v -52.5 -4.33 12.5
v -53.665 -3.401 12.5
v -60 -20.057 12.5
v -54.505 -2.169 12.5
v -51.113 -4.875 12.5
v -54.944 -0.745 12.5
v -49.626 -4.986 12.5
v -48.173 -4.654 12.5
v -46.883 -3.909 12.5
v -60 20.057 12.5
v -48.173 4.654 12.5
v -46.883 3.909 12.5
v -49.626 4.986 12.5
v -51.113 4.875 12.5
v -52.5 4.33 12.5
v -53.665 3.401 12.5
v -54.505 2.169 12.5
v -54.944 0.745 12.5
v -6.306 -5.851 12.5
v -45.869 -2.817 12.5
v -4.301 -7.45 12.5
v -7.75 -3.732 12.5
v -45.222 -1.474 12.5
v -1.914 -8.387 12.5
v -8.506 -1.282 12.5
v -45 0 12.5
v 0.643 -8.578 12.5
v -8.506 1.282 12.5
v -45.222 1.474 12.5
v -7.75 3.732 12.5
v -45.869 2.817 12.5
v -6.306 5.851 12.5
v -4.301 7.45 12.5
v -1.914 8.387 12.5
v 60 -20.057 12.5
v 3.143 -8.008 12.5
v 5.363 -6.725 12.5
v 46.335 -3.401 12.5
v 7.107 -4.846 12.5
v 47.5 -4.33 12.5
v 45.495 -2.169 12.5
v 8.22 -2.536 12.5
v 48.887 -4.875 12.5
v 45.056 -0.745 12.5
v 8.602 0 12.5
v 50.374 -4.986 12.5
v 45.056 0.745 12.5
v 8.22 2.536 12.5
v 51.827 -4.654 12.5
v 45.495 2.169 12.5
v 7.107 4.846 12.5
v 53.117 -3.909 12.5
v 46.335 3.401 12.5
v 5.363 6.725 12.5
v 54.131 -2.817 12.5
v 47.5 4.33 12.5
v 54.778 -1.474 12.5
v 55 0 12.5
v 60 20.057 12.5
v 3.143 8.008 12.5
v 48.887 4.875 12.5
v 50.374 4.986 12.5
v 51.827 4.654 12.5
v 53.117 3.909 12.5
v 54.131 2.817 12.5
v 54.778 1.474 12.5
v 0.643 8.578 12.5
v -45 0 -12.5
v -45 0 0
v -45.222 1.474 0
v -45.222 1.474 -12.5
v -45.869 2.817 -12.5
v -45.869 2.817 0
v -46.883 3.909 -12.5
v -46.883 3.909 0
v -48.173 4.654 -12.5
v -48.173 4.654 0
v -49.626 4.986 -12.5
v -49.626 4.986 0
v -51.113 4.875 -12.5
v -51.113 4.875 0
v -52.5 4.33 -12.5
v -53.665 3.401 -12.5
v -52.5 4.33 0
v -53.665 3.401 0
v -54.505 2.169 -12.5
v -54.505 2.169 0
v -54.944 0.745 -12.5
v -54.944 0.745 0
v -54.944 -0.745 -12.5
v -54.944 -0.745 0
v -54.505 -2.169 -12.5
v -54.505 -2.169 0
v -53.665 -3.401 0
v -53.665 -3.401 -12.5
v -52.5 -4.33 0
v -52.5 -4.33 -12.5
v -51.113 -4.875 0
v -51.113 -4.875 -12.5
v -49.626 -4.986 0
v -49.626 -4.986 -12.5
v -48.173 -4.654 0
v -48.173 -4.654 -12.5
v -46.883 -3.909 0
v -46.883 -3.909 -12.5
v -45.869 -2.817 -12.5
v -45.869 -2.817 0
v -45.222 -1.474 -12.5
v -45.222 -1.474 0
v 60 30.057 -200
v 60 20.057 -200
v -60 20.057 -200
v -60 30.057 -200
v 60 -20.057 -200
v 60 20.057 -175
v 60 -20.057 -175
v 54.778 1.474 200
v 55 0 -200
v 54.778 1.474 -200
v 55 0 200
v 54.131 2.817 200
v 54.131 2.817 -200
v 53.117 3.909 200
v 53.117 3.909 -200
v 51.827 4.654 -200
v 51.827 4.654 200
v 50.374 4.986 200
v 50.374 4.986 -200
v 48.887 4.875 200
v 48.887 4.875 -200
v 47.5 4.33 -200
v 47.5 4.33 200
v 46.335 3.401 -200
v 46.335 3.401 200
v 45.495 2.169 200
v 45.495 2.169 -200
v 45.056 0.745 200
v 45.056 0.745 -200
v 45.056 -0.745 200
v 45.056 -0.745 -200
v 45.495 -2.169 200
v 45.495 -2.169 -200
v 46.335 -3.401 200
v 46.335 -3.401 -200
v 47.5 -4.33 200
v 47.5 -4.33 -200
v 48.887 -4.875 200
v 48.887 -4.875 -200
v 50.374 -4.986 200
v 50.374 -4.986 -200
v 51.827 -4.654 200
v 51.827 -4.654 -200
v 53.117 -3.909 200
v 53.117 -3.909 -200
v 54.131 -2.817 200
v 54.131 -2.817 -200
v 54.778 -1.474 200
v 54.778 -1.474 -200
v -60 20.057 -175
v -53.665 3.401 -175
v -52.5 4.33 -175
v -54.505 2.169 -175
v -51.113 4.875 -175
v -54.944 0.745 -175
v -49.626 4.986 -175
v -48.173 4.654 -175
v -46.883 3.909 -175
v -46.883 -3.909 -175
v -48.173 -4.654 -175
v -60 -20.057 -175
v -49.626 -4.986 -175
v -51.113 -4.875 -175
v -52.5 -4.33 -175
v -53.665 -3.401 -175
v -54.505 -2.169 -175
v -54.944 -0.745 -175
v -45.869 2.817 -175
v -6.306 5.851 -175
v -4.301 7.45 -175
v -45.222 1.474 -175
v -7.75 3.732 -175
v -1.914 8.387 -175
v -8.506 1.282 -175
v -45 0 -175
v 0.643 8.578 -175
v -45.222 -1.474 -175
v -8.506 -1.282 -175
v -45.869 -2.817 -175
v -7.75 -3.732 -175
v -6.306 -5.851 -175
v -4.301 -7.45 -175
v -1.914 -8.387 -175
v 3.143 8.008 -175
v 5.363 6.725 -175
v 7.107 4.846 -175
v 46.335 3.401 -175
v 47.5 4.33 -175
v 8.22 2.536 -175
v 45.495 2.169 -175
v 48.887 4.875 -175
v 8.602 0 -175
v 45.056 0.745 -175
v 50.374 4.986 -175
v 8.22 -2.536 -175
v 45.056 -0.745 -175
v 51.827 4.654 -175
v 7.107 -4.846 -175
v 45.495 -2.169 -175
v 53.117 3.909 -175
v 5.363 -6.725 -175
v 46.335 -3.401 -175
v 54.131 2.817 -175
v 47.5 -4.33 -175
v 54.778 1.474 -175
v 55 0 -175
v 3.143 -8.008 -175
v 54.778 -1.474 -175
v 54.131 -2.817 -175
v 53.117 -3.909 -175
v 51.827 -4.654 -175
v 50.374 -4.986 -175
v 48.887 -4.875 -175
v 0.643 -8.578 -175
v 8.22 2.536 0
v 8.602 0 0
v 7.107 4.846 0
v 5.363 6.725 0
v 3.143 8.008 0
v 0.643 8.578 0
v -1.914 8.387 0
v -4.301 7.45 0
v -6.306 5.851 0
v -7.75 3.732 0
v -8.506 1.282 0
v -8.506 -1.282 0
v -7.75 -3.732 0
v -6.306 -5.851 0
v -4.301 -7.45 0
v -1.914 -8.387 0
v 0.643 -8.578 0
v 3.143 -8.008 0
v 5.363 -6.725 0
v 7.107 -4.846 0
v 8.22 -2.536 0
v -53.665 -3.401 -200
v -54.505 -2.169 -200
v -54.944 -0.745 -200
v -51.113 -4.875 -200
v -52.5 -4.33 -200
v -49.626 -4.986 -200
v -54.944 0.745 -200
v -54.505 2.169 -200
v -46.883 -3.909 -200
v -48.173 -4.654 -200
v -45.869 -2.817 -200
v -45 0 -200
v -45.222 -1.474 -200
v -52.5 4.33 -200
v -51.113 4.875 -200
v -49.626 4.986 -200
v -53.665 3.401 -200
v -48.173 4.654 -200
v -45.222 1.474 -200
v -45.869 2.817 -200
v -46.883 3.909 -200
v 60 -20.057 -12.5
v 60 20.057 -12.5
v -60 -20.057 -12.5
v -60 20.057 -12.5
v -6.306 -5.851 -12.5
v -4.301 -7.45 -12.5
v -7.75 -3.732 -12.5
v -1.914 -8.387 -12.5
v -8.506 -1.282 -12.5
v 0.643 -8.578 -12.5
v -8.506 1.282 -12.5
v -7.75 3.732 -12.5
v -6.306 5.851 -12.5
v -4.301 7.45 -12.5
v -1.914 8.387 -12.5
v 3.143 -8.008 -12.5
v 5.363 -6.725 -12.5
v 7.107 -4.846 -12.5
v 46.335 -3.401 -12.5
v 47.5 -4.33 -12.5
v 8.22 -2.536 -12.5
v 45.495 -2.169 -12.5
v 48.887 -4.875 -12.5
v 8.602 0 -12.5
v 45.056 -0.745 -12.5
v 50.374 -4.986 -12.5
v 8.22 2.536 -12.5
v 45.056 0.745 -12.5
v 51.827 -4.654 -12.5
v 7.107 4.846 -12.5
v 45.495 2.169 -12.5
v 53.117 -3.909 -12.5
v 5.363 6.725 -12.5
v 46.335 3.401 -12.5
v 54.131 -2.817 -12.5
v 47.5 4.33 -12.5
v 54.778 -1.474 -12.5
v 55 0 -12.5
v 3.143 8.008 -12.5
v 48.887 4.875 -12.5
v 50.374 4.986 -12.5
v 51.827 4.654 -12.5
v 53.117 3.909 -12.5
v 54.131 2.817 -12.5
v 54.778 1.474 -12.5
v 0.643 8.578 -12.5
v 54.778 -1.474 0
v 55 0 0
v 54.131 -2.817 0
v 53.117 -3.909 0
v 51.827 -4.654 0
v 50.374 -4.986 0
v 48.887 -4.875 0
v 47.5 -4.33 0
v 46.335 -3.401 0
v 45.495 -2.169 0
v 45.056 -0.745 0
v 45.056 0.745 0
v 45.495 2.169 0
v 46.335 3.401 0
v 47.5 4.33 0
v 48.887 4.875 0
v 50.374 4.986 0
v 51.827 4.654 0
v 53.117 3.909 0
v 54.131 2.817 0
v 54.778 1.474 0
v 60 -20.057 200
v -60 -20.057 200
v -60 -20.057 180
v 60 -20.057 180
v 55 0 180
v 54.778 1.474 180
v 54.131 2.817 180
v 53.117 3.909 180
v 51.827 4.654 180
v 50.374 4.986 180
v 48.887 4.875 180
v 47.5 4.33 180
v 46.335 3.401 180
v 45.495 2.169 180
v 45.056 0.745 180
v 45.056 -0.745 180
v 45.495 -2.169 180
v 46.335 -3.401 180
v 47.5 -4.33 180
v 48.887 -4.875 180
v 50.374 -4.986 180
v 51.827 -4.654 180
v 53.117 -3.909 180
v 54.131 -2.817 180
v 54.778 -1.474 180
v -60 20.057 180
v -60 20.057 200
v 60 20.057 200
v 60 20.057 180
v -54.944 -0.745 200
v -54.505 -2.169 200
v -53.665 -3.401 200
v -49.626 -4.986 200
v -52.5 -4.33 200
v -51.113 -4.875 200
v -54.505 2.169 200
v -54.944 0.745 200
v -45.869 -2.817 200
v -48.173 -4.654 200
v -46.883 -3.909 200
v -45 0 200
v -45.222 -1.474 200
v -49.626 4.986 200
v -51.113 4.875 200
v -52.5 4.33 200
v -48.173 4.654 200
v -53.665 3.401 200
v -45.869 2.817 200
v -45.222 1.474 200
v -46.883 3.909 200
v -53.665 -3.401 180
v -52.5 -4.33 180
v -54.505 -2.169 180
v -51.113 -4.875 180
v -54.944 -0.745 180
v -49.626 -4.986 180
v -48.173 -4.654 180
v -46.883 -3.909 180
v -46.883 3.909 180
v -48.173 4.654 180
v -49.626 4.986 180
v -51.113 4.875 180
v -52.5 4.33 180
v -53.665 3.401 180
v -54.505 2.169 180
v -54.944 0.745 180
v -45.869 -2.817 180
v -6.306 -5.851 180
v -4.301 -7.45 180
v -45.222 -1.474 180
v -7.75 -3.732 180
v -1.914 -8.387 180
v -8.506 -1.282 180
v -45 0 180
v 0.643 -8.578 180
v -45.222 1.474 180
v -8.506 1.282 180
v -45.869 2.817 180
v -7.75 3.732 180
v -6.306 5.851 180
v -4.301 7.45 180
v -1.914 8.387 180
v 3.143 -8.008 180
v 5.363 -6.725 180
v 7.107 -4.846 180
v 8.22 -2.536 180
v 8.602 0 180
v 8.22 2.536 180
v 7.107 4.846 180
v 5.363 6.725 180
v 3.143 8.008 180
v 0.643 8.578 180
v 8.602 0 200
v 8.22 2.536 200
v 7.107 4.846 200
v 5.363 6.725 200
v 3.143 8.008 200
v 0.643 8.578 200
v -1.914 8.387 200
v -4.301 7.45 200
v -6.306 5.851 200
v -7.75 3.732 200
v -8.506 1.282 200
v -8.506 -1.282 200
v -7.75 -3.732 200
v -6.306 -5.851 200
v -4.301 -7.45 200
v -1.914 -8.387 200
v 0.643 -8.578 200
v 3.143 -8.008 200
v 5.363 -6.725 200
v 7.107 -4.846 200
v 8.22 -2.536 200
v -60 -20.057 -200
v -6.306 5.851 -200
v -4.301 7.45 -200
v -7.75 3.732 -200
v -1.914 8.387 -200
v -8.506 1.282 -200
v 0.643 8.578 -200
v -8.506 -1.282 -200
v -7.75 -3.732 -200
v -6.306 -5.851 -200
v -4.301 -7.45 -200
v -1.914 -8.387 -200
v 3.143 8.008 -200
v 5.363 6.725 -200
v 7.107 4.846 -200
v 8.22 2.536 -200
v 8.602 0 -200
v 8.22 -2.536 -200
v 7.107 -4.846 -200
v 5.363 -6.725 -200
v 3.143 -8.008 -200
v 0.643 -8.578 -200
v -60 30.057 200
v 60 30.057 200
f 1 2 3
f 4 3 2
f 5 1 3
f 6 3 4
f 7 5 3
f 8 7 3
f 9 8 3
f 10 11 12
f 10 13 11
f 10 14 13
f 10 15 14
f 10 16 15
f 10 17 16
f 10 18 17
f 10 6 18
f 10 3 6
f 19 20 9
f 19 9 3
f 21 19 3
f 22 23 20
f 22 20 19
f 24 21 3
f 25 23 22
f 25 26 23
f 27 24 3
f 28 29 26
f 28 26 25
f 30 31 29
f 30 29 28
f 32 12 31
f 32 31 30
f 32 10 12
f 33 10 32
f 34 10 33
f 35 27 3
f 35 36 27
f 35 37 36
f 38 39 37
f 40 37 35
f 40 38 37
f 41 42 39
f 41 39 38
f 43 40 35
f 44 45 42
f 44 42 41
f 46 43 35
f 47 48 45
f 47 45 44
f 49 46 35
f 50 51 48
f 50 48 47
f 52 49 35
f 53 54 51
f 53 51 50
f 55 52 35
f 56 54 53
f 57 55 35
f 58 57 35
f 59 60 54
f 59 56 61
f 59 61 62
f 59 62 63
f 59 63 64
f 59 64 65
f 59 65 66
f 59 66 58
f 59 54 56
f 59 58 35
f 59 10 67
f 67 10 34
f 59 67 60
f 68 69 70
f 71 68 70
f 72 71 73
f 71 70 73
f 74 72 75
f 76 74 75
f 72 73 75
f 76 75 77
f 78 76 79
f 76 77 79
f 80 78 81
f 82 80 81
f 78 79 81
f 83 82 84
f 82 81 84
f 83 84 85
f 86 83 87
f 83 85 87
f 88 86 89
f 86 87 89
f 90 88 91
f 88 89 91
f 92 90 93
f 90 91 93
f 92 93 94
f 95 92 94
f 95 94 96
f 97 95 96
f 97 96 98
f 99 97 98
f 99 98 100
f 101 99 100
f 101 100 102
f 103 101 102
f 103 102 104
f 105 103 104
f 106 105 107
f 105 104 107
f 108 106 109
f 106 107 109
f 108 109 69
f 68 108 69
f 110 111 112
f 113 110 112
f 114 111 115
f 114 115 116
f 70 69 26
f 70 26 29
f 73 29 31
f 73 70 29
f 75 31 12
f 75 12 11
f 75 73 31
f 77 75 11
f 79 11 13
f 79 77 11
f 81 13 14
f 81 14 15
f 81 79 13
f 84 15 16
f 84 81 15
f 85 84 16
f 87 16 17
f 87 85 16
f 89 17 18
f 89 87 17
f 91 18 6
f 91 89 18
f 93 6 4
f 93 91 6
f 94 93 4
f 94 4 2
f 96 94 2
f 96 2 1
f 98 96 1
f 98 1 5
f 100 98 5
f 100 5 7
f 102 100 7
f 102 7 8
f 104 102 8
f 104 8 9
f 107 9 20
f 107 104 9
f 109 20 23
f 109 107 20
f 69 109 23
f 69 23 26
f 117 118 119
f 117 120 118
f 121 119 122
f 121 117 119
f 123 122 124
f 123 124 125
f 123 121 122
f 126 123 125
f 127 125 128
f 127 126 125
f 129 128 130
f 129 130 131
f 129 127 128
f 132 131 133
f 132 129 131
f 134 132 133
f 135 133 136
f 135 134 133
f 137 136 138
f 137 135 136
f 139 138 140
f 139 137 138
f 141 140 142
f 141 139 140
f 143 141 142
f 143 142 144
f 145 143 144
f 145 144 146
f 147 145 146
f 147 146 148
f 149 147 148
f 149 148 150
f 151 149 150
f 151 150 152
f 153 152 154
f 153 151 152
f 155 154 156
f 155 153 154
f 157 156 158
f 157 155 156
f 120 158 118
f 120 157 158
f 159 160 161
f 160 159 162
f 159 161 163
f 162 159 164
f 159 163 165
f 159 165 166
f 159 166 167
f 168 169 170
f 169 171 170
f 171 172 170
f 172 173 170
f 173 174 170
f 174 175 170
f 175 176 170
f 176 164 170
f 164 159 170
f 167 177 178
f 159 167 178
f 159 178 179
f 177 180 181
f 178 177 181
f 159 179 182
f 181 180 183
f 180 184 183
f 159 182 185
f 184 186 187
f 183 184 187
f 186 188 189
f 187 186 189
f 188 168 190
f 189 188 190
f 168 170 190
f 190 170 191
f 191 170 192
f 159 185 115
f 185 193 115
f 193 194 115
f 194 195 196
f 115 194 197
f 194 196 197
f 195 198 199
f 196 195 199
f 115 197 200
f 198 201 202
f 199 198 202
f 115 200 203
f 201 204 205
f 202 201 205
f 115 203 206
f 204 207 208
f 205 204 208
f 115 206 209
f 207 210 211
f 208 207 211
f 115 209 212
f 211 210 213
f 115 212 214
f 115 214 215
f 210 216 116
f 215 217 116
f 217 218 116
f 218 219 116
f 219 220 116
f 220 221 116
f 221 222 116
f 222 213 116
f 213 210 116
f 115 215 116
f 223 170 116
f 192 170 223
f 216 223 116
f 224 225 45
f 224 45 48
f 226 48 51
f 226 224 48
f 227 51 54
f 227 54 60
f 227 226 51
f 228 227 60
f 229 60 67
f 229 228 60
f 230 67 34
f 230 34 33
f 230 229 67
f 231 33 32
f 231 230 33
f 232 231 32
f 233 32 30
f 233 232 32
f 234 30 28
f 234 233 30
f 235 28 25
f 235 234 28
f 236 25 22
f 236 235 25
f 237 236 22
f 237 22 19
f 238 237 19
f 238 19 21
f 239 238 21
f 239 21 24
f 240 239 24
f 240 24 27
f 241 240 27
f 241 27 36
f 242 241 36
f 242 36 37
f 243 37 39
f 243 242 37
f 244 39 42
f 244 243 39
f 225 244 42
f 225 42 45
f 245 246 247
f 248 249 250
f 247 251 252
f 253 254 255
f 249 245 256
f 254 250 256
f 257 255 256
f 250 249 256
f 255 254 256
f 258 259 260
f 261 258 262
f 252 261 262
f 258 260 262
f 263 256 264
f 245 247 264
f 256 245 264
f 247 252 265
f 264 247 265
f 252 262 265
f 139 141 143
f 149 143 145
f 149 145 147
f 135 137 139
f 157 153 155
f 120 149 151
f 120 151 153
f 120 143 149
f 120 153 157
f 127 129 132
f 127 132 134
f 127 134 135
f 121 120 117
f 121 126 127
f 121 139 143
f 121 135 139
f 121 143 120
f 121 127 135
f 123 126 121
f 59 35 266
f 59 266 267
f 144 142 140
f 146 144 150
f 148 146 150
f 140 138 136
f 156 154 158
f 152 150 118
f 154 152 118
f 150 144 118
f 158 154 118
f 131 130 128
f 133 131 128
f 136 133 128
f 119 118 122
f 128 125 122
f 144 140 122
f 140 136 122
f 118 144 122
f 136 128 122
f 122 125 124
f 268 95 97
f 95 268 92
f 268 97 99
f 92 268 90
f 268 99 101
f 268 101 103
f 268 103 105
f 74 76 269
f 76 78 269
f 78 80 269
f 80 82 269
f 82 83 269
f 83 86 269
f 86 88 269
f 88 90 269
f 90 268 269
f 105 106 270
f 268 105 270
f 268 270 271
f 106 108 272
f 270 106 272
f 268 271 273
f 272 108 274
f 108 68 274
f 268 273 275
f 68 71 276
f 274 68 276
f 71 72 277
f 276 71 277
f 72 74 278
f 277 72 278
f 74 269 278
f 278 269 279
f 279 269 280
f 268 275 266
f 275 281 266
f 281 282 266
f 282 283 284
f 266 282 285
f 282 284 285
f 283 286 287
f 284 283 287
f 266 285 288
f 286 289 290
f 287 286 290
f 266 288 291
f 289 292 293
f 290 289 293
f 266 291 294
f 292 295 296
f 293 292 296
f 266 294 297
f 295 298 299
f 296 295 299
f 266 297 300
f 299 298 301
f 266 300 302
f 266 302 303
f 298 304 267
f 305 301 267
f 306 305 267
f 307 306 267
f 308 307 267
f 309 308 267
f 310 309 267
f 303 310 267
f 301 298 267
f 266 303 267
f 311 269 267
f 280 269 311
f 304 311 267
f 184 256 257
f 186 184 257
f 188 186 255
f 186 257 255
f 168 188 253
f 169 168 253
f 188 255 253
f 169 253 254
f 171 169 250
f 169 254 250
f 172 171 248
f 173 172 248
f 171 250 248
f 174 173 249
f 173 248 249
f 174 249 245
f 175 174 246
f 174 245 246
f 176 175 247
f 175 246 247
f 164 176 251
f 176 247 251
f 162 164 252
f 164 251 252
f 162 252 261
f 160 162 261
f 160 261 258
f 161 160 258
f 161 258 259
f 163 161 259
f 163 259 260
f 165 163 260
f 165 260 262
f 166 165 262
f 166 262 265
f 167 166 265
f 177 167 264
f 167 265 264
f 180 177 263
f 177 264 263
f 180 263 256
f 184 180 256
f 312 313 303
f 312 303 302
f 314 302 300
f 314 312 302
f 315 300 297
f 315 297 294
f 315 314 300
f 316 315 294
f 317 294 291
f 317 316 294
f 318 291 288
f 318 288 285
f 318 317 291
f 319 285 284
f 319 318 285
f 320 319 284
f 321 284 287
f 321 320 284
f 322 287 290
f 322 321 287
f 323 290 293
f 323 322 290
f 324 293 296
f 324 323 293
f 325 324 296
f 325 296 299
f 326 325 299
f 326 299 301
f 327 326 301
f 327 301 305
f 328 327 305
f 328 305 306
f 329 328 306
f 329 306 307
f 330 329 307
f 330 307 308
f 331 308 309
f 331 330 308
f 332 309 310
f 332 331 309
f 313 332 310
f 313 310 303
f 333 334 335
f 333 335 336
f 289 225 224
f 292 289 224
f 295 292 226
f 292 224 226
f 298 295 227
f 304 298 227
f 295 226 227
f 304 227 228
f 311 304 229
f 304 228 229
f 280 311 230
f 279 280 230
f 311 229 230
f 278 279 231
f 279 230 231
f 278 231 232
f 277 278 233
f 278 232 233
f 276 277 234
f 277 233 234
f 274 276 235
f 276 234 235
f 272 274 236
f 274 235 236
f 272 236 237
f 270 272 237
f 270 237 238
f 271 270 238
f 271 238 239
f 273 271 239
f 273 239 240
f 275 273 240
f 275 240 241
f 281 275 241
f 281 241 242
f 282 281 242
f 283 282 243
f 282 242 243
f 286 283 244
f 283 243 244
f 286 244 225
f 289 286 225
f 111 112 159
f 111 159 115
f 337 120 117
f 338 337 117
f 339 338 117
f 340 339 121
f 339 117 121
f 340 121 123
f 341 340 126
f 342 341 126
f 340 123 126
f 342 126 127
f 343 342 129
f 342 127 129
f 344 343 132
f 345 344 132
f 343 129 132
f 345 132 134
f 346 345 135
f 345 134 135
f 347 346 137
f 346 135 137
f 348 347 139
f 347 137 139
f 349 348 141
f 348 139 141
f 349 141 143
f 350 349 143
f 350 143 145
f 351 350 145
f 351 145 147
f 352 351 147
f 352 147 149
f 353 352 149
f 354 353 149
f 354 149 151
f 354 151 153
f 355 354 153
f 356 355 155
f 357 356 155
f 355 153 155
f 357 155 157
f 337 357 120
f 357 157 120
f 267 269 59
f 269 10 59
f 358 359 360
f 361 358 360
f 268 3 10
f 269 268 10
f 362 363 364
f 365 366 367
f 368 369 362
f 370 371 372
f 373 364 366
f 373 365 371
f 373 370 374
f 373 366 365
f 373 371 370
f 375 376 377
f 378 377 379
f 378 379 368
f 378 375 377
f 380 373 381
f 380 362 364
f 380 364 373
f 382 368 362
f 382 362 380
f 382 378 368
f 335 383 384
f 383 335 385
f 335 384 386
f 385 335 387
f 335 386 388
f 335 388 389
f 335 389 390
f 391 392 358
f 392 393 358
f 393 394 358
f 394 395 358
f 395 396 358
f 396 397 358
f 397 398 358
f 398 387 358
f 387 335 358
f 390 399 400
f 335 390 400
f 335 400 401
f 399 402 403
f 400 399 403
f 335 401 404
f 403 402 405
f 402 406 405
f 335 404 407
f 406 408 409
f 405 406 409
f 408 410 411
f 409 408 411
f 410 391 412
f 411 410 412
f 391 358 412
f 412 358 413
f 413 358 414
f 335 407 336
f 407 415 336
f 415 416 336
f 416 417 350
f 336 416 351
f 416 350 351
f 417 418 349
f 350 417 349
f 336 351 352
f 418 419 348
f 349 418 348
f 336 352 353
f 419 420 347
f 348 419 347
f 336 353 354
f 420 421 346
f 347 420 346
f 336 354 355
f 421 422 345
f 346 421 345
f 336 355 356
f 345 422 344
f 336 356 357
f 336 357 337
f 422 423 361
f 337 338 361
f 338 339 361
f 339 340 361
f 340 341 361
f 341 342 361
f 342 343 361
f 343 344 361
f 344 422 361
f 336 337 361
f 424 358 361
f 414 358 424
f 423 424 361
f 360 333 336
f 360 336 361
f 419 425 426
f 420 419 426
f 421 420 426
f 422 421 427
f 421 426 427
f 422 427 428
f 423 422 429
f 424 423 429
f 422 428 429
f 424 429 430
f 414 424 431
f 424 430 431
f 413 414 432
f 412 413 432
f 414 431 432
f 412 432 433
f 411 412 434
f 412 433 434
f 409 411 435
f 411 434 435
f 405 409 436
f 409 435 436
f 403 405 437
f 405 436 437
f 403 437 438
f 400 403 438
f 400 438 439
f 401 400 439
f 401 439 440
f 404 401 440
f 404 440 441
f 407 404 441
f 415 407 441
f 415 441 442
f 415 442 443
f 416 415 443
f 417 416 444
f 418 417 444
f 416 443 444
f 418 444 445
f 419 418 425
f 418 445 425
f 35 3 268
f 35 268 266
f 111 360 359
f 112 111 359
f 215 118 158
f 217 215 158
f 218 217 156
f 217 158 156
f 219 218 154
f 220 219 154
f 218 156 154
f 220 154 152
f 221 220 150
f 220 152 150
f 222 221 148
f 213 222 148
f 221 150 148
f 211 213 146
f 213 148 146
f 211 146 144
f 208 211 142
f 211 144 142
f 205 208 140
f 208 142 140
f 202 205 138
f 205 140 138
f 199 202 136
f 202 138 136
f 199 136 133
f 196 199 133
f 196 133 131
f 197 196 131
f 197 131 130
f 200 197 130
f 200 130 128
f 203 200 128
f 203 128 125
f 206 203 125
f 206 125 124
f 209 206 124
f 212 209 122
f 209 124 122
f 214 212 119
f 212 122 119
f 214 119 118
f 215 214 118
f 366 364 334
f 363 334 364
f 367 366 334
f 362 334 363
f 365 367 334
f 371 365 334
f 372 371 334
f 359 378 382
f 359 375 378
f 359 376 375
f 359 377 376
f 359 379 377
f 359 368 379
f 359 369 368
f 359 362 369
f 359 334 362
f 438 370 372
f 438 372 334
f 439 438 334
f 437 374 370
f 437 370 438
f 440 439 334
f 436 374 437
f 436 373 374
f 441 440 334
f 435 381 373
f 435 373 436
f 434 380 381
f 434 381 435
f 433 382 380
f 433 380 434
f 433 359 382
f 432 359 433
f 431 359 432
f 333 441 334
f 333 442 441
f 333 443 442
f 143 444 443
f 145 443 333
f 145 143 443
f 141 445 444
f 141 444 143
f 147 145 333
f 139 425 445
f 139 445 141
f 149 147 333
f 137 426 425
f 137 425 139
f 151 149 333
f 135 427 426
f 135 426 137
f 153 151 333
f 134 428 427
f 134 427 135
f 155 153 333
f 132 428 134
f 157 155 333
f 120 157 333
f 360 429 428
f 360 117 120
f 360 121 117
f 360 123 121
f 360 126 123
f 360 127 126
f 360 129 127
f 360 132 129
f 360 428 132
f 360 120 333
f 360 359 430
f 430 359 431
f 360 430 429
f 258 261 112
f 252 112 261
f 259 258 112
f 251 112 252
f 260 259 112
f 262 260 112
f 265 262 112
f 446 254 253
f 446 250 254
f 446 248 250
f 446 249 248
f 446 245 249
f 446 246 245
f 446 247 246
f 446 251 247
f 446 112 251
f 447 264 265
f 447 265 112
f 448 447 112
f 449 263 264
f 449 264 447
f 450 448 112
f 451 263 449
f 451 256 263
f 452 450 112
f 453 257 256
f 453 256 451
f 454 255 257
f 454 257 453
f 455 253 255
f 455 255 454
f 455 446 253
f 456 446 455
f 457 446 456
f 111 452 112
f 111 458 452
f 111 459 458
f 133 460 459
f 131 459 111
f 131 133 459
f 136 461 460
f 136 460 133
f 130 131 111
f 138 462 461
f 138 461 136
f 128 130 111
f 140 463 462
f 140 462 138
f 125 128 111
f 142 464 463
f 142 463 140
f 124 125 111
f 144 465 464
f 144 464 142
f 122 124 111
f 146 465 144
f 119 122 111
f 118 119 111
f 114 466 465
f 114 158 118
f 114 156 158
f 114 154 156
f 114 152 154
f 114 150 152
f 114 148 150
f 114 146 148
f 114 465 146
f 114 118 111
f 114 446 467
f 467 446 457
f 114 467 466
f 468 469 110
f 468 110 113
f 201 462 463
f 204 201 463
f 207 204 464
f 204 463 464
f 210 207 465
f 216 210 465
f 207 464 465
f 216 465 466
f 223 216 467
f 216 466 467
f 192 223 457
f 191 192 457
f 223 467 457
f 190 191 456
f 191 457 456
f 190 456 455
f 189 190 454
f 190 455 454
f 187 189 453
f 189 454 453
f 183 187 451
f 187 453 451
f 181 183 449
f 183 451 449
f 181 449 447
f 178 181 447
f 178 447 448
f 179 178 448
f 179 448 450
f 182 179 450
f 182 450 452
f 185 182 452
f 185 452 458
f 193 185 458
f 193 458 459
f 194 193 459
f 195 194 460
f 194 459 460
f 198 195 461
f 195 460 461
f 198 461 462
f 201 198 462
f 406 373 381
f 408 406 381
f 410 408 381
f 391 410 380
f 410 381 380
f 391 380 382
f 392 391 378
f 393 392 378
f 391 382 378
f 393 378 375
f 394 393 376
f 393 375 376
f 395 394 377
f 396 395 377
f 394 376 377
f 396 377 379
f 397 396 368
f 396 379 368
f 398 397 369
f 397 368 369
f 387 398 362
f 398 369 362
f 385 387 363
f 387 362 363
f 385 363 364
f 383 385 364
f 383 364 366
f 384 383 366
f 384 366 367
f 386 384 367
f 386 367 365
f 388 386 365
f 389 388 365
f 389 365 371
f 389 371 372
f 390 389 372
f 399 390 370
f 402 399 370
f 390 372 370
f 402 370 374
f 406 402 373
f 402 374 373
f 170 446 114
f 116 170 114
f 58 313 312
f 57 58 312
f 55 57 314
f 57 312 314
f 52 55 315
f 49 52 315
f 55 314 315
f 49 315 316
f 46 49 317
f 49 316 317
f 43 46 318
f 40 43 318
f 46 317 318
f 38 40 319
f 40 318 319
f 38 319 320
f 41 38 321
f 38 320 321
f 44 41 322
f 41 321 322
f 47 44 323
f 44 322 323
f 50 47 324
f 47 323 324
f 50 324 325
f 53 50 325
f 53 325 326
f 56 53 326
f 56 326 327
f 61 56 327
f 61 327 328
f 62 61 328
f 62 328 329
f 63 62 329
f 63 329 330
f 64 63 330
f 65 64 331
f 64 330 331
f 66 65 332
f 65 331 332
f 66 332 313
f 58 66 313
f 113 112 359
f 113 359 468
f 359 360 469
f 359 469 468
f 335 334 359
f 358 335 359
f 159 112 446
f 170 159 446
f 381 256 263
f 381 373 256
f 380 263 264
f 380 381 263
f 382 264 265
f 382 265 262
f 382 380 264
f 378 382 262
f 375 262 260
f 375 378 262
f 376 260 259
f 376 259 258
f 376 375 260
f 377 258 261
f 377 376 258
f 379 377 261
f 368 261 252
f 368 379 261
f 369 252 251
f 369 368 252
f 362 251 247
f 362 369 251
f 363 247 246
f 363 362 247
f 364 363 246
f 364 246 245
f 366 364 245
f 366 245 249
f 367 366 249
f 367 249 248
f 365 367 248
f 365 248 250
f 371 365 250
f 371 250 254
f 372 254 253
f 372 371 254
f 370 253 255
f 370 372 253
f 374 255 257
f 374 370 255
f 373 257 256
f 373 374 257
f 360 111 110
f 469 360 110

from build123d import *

# Parameters (mm, degrees)
F0_R     = 5
F1_DEPTH = 200
F2_W     = 120
F2_H     = 40.1148218211
F2_R     = 5
F2_R_2   = 8.6022132759
F4_DEPTH = 20
F3_W     = 120
F3_H     = 40.1148218211
F3_R     = 5
F3_R_2   = 8.6022132759
F5_DEPTH = 25
F6_W     = 120
F6_H     = 25
F7_DEPTH = 10
F6_H_2   = 20
F8_DEPTH = 355
F0_W     = 120
F0_H     = 40.1148218211
F0_R_2   = 8.6022132759
F9_DEPTH = 12.5


with BuildPart() as f1:
    # F0 (on Top) → F1 (new body, symmetric)
    with BuildSketch(Plane.XY):
        with Locations((-50, 0)):
            Circle(F0_R)
    extrude(amount=F1_DEPTH, both=True)


with BuildPart() as f1b:
    # F0 (on Top) → F1, piece 2 (new body, symmetric)
    with BuildSketch(Plane.XY):
        with BuildLine():
            ThreePointArc((45, 0), (50, -5), (55, 0))
            ThreePointArc((55, 0), (50, 5), (45, 0))
        make_face()
    extrude(amount=F1_DEPTH, both=True)


with BuildPart() as f4:
    # F2 (on face) → F4 (new body)
    with BuildSketch(Plane.XY.offset(200)):
        Rectangle(F2_W, F2_H)
        with Locations((-50, 0)):
            Circle(F2_R, mode=Mode.SUBTRACT)
        Circle(F2_R_2, mode=Mode.SUBTRACT)
        with Locations((50, 0)):
            Circle(F2_R, mode=Mode.SUBTRACT)
    extrude(amount=-F4_DEPTH)


with BuildPart() as f5:
    # F3 (on face) → F5 (new body)
    with BuildSketch(Plane(origin=(0, 0, -200), x_dir=(1, 0, 0), z_dir=(0, 0, -1))):
        Rectangle(F3_W, F3_H)
        with Locations((-50, 0)):
            Circle(F3_R, mode=Mode.SUBTRACT)
        Circle(F3_R_2, mode=Mode.SUBTRACT)
        with Locations((50, 0)):
            Circle(F3_R, mode=Mode.SUBTRACT)
    extrude(amount=-F5_DEPTH)


with BuildPart() as f7:
    # F6 (on face) → F7 (new body)
    with BuildSketch(Plane(origin=(0, 20.0574109105, 0), x_dir=(-1, 0, 0), z_dir=(0, 1, 0))):
        with Locations((0, -187.5)):
            Rectangle(F6_W, F6_H)
    extrude(amount=F7_DEPTH)

    # F8 (add, through all): a face of the model
    f8_faces = [f7.faces().sort_by_distance(p)[0] for p in [
        (0, 25.0574109105, -175),
    ]]


with BuildPart() as f7b:
    # F6 (on face) → F7, piece 2 (new body)
    with BuildSketch(Plane(origin=(0, 20.0574109105, 0), x_dir=(-1, 0, 0), z_dir=(0, 1, 0))):
        with Locations((0, 190)):
            Rectangle(F6_W, F6_H_2)
    extrude(amount=F7_DEPTH)


with BuildPart() as f7_1:
    add(f7.part)

    add(f7b.part)  # F8 merges F7b
    extrude(f8_faces, amount=F8_DEPTH)


with BuildPart() as f9:
    # F0 (on Top) → F9 (new body, symmetric)
    with BuildSketch(Plane.XY):
        Rectangle(F0_W, F0_H)
        with Locations((-50, 0)):
            Circle(F0_R, mode=Mode.SUBTRACT)
        Circle(F0_R_2, mode=Mode.SUBTRACT)
        with BuildLine():
            ThreePointArc((45, 0), (50, 5), (55, 0))
            ThreePointArc((55, 0), (50, -5), (45, 0))
        make_face(mode=Mode.SUBTRACT)
    extrude(amount=F9_DEPTH, both=True)


solid = Compound([f1.part, f1b.part, f4.part, f5.part, f7_1.part, f9.part])
